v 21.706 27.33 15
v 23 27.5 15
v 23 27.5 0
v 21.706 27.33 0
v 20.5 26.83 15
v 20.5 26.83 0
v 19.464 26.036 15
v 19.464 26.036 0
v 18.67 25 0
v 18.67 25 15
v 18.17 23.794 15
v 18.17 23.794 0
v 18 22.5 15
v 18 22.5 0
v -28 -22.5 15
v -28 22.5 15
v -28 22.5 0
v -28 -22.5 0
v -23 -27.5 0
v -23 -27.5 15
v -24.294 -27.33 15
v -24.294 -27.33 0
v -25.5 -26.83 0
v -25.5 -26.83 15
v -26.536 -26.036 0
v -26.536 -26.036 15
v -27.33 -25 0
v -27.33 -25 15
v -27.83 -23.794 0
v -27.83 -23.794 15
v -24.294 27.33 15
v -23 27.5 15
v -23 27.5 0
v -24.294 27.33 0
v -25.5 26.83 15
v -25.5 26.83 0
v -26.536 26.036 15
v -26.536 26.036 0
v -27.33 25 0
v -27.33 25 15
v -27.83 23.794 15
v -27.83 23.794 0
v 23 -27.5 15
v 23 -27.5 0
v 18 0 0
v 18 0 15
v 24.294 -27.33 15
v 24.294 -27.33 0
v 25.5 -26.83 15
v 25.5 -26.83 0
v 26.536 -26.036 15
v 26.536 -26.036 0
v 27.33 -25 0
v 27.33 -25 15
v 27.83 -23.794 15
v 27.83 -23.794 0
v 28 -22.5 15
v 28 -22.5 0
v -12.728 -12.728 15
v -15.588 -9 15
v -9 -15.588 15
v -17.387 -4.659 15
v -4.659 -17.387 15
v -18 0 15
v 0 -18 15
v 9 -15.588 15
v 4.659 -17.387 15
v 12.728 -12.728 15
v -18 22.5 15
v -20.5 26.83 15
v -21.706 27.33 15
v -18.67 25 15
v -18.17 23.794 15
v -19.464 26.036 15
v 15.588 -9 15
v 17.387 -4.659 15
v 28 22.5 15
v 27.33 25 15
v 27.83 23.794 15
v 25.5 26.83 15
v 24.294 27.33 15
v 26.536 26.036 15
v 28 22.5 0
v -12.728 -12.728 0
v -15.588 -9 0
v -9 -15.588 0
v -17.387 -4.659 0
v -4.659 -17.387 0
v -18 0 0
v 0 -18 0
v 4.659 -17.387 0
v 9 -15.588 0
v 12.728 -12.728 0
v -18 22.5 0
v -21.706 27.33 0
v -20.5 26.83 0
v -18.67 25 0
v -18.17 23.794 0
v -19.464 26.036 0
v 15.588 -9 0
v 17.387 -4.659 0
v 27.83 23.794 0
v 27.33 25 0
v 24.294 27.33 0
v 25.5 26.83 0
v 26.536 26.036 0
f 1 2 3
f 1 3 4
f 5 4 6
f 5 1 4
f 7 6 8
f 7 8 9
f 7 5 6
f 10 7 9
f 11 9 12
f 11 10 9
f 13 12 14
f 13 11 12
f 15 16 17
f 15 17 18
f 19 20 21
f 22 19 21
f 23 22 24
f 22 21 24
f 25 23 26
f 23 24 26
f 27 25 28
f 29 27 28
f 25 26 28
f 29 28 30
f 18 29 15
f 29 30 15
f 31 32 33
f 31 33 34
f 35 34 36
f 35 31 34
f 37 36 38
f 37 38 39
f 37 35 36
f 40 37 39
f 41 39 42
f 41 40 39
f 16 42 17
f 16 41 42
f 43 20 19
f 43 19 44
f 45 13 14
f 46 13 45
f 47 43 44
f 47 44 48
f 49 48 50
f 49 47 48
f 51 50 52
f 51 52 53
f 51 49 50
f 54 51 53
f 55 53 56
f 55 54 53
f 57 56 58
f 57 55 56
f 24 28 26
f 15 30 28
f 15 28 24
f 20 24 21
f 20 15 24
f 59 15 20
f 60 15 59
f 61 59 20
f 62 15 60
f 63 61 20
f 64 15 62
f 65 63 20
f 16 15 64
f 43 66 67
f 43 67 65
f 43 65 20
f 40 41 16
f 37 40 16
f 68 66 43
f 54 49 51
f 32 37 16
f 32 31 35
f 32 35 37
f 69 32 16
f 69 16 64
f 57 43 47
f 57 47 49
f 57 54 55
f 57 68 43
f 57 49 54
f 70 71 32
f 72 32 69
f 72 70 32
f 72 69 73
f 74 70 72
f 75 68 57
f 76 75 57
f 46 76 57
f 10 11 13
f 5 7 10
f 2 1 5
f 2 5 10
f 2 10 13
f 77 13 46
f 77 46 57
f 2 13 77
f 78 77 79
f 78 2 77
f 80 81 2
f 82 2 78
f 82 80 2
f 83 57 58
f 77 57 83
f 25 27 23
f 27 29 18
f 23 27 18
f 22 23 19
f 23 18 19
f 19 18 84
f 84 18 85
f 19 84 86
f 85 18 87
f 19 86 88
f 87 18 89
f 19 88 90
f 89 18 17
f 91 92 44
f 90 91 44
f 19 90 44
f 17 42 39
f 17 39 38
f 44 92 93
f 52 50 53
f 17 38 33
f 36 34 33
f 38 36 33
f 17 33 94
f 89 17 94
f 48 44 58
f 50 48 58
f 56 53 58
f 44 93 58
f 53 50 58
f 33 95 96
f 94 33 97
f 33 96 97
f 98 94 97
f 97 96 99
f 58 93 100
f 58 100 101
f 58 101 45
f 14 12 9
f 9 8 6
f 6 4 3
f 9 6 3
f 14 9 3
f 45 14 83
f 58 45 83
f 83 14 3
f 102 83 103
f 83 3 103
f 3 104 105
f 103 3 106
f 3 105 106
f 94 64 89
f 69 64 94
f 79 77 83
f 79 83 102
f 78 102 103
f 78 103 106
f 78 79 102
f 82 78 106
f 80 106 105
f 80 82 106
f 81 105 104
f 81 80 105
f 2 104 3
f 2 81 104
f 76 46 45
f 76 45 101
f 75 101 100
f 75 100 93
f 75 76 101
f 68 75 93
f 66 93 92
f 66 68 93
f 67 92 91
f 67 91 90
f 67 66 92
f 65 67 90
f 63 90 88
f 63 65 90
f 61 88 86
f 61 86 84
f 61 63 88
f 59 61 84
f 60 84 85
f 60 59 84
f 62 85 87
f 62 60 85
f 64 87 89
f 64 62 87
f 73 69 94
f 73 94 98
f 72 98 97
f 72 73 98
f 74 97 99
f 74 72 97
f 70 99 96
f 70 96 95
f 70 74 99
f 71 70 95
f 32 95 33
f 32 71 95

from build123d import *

# Parameters (mm, degrees)
F1_DEPTH = 25
F2_R     = 4.99999
F3_DEPTH = 15
F4_DEPTH = 10


# Not quite as in the source:
# - a fillet or chamfer is up to 0.001 mm smaller than in the source, because OpenCascade refuses the exact size


with BuildPart() as f1:
    # F0 (on Top) → F1 (new body)
    with BuildSketch(Plane.XY):
        with BuildLine():
            Line((-28, -27.5), (28, -27.5))
            Line((28, -27.5), (28, 27.5))
            Line((28, 27.5), (18, 27.5))
            Line((18, 27.5), (18, 0))
            ThreePointArc((18, 0), (0, -18), (-18, 0))
            Line((-18, 0), (-18, 27.5))
            Line((-18, 27.5), (-28, 27.5))
            Line((-28, 27.5), (-28, -27.5))
        make_face()
    extrude(amount=F1_DEPTH)

    # F2 (radius 5 in the source; OpenCascade refuses exactly that, so slightly less here)
    f2_edges = [f1.edges().sort_by_distance(p)[0] for p in [
        (18, 27.5, 12.5),
        (-18, 27.5, 12.5),
        (28, 27.5, 12.5),
        (-28, 27.5, 12.5),
        (-28, -27.5, 12.5),
        (28, -27.5, 12.5),
    ]]
    fillet(f2_edges, radius=F2_R)

    # F3 (add): a face of the model
    f3_faces = [f1.faces().sort_by_distance(p)[0] for p in [
        (0, -26.7150796219, 25),
    ]]
    extrude(f3_faces, amount=-F3_DEPTH)

    # F4 (cut): a face of the model
    f4_faces = [f1.faces().sort_by_distance(p)[0] for p in [
        (0, -26.7150796219, 25),
    ]]
    extrude(f4_faces, amount=-F4_DEPTH, mode=Mode.SUBTRACT)


solid = f1.part
